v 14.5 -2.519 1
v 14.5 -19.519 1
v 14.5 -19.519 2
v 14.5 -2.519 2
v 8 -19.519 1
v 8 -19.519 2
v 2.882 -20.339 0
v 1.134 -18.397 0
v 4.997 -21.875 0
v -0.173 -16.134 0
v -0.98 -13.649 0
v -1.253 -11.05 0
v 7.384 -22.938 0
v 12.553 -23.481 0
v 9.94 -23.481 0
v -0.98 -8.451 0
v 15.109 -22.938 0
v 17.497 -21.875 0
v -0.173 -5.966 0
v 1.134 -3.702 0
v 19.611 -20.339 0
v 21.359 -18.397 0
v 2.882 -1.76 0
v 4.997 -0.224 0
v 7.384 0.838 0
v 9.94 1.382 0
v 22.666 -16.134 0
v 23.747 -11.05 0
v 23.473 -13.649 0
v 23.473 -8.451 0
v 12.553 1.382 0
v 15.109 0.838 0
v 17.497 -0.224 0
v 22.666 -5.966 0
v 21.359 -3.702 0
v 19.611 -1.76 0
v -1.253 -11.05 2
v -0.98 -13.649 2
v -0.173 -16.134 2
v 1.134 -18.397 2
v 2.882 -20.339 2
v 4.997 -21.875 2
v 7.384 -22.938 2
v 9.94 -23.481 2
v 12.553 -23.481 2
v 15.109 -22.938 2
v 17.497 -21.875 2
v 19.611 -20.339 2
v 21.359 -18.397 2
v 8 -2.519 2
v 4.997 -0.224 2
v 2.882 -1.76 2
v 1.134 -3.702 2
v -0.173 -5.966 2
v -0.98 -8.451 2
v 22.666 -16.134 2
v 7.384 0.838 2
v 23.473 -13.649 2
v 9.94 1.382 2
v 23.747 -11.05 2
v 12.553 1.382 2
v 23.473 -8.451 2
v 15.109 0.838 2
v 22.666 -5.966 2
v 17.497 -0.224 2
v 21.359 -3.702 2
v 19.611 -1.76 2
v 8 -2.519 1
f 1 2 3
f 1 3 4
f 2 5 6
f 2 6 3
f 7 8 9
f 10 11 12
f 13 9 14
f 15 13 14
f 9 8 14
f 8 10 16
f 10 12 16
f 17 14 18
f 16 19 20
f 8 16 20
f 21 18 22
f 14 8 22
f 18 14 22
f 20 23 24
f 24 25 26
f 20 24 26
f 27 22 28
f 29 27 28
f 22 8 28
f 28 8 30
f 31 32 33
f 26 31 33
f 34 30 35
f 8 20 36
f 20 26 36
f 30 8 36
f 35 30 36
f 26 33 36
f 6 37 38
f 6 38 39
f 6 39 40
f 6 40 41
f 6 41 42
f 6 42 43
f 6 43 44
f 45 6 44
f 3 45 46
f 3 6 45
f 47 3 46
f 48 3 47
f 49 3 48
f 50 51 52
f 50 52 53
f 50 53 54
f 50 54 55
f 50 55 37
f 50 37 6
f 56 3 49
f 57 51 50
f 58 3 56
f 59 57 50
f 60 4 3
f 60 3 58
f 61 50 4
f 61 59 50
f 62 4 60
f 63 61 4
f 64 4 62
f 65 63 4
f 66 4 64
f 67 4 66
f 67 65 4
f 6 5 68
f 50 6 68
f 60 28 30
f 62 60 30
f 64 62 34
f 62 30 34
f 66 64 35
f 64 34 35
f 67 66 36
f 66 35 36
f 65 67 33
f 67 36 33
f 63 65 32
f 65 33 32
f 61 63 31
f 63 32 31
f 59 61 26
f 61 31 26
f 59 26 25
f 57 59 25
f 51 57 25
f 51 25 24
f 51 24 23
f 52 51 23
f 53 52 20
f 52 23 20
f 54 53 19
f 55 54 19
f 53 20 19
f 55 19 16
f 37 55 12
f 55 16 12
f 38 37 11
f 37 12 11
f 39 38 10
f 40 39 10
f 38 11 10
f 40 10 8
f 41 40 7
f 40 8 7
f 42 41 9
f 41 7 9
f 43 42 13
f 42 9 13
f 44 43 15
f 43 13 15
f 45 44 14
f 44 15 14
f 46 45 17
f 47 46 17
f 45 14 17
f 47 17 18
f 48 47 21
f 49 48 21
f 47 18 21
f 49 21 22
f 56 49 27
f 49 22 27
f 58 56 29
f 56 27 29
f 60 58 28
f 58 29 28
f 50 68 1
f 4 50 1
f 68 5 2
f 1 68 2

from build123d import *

# Parameters (mm, degrees)
F0_W     = 6.5
F0_H     = 17
F1_DEPTH = 1
F0_R     = 12.5
F2_DEPTH = 2


with BuildPart() as f1:
    # F0 (on Top) → F1 (new body)
    with BuildSketch(Plane.XY):
        with Locations((11.249999, -11.019001)):
            Rectangle(F0_W, F0_H)
    extrude(amount=F1_DEPTH)

    # F0 (on Top) → F2 (join)
    with BuildSketch(Plane.XY):
        with Locations((11.246626, -11.0498)):
            Circle(F0_R)
        with Locations((11.249999, -11.019001)):
            Rectangle(F0_W, F0_H, mode=Mode.SUBTRACT)
    extrude(amount=F2_DEPTH)


solid = f1.part
